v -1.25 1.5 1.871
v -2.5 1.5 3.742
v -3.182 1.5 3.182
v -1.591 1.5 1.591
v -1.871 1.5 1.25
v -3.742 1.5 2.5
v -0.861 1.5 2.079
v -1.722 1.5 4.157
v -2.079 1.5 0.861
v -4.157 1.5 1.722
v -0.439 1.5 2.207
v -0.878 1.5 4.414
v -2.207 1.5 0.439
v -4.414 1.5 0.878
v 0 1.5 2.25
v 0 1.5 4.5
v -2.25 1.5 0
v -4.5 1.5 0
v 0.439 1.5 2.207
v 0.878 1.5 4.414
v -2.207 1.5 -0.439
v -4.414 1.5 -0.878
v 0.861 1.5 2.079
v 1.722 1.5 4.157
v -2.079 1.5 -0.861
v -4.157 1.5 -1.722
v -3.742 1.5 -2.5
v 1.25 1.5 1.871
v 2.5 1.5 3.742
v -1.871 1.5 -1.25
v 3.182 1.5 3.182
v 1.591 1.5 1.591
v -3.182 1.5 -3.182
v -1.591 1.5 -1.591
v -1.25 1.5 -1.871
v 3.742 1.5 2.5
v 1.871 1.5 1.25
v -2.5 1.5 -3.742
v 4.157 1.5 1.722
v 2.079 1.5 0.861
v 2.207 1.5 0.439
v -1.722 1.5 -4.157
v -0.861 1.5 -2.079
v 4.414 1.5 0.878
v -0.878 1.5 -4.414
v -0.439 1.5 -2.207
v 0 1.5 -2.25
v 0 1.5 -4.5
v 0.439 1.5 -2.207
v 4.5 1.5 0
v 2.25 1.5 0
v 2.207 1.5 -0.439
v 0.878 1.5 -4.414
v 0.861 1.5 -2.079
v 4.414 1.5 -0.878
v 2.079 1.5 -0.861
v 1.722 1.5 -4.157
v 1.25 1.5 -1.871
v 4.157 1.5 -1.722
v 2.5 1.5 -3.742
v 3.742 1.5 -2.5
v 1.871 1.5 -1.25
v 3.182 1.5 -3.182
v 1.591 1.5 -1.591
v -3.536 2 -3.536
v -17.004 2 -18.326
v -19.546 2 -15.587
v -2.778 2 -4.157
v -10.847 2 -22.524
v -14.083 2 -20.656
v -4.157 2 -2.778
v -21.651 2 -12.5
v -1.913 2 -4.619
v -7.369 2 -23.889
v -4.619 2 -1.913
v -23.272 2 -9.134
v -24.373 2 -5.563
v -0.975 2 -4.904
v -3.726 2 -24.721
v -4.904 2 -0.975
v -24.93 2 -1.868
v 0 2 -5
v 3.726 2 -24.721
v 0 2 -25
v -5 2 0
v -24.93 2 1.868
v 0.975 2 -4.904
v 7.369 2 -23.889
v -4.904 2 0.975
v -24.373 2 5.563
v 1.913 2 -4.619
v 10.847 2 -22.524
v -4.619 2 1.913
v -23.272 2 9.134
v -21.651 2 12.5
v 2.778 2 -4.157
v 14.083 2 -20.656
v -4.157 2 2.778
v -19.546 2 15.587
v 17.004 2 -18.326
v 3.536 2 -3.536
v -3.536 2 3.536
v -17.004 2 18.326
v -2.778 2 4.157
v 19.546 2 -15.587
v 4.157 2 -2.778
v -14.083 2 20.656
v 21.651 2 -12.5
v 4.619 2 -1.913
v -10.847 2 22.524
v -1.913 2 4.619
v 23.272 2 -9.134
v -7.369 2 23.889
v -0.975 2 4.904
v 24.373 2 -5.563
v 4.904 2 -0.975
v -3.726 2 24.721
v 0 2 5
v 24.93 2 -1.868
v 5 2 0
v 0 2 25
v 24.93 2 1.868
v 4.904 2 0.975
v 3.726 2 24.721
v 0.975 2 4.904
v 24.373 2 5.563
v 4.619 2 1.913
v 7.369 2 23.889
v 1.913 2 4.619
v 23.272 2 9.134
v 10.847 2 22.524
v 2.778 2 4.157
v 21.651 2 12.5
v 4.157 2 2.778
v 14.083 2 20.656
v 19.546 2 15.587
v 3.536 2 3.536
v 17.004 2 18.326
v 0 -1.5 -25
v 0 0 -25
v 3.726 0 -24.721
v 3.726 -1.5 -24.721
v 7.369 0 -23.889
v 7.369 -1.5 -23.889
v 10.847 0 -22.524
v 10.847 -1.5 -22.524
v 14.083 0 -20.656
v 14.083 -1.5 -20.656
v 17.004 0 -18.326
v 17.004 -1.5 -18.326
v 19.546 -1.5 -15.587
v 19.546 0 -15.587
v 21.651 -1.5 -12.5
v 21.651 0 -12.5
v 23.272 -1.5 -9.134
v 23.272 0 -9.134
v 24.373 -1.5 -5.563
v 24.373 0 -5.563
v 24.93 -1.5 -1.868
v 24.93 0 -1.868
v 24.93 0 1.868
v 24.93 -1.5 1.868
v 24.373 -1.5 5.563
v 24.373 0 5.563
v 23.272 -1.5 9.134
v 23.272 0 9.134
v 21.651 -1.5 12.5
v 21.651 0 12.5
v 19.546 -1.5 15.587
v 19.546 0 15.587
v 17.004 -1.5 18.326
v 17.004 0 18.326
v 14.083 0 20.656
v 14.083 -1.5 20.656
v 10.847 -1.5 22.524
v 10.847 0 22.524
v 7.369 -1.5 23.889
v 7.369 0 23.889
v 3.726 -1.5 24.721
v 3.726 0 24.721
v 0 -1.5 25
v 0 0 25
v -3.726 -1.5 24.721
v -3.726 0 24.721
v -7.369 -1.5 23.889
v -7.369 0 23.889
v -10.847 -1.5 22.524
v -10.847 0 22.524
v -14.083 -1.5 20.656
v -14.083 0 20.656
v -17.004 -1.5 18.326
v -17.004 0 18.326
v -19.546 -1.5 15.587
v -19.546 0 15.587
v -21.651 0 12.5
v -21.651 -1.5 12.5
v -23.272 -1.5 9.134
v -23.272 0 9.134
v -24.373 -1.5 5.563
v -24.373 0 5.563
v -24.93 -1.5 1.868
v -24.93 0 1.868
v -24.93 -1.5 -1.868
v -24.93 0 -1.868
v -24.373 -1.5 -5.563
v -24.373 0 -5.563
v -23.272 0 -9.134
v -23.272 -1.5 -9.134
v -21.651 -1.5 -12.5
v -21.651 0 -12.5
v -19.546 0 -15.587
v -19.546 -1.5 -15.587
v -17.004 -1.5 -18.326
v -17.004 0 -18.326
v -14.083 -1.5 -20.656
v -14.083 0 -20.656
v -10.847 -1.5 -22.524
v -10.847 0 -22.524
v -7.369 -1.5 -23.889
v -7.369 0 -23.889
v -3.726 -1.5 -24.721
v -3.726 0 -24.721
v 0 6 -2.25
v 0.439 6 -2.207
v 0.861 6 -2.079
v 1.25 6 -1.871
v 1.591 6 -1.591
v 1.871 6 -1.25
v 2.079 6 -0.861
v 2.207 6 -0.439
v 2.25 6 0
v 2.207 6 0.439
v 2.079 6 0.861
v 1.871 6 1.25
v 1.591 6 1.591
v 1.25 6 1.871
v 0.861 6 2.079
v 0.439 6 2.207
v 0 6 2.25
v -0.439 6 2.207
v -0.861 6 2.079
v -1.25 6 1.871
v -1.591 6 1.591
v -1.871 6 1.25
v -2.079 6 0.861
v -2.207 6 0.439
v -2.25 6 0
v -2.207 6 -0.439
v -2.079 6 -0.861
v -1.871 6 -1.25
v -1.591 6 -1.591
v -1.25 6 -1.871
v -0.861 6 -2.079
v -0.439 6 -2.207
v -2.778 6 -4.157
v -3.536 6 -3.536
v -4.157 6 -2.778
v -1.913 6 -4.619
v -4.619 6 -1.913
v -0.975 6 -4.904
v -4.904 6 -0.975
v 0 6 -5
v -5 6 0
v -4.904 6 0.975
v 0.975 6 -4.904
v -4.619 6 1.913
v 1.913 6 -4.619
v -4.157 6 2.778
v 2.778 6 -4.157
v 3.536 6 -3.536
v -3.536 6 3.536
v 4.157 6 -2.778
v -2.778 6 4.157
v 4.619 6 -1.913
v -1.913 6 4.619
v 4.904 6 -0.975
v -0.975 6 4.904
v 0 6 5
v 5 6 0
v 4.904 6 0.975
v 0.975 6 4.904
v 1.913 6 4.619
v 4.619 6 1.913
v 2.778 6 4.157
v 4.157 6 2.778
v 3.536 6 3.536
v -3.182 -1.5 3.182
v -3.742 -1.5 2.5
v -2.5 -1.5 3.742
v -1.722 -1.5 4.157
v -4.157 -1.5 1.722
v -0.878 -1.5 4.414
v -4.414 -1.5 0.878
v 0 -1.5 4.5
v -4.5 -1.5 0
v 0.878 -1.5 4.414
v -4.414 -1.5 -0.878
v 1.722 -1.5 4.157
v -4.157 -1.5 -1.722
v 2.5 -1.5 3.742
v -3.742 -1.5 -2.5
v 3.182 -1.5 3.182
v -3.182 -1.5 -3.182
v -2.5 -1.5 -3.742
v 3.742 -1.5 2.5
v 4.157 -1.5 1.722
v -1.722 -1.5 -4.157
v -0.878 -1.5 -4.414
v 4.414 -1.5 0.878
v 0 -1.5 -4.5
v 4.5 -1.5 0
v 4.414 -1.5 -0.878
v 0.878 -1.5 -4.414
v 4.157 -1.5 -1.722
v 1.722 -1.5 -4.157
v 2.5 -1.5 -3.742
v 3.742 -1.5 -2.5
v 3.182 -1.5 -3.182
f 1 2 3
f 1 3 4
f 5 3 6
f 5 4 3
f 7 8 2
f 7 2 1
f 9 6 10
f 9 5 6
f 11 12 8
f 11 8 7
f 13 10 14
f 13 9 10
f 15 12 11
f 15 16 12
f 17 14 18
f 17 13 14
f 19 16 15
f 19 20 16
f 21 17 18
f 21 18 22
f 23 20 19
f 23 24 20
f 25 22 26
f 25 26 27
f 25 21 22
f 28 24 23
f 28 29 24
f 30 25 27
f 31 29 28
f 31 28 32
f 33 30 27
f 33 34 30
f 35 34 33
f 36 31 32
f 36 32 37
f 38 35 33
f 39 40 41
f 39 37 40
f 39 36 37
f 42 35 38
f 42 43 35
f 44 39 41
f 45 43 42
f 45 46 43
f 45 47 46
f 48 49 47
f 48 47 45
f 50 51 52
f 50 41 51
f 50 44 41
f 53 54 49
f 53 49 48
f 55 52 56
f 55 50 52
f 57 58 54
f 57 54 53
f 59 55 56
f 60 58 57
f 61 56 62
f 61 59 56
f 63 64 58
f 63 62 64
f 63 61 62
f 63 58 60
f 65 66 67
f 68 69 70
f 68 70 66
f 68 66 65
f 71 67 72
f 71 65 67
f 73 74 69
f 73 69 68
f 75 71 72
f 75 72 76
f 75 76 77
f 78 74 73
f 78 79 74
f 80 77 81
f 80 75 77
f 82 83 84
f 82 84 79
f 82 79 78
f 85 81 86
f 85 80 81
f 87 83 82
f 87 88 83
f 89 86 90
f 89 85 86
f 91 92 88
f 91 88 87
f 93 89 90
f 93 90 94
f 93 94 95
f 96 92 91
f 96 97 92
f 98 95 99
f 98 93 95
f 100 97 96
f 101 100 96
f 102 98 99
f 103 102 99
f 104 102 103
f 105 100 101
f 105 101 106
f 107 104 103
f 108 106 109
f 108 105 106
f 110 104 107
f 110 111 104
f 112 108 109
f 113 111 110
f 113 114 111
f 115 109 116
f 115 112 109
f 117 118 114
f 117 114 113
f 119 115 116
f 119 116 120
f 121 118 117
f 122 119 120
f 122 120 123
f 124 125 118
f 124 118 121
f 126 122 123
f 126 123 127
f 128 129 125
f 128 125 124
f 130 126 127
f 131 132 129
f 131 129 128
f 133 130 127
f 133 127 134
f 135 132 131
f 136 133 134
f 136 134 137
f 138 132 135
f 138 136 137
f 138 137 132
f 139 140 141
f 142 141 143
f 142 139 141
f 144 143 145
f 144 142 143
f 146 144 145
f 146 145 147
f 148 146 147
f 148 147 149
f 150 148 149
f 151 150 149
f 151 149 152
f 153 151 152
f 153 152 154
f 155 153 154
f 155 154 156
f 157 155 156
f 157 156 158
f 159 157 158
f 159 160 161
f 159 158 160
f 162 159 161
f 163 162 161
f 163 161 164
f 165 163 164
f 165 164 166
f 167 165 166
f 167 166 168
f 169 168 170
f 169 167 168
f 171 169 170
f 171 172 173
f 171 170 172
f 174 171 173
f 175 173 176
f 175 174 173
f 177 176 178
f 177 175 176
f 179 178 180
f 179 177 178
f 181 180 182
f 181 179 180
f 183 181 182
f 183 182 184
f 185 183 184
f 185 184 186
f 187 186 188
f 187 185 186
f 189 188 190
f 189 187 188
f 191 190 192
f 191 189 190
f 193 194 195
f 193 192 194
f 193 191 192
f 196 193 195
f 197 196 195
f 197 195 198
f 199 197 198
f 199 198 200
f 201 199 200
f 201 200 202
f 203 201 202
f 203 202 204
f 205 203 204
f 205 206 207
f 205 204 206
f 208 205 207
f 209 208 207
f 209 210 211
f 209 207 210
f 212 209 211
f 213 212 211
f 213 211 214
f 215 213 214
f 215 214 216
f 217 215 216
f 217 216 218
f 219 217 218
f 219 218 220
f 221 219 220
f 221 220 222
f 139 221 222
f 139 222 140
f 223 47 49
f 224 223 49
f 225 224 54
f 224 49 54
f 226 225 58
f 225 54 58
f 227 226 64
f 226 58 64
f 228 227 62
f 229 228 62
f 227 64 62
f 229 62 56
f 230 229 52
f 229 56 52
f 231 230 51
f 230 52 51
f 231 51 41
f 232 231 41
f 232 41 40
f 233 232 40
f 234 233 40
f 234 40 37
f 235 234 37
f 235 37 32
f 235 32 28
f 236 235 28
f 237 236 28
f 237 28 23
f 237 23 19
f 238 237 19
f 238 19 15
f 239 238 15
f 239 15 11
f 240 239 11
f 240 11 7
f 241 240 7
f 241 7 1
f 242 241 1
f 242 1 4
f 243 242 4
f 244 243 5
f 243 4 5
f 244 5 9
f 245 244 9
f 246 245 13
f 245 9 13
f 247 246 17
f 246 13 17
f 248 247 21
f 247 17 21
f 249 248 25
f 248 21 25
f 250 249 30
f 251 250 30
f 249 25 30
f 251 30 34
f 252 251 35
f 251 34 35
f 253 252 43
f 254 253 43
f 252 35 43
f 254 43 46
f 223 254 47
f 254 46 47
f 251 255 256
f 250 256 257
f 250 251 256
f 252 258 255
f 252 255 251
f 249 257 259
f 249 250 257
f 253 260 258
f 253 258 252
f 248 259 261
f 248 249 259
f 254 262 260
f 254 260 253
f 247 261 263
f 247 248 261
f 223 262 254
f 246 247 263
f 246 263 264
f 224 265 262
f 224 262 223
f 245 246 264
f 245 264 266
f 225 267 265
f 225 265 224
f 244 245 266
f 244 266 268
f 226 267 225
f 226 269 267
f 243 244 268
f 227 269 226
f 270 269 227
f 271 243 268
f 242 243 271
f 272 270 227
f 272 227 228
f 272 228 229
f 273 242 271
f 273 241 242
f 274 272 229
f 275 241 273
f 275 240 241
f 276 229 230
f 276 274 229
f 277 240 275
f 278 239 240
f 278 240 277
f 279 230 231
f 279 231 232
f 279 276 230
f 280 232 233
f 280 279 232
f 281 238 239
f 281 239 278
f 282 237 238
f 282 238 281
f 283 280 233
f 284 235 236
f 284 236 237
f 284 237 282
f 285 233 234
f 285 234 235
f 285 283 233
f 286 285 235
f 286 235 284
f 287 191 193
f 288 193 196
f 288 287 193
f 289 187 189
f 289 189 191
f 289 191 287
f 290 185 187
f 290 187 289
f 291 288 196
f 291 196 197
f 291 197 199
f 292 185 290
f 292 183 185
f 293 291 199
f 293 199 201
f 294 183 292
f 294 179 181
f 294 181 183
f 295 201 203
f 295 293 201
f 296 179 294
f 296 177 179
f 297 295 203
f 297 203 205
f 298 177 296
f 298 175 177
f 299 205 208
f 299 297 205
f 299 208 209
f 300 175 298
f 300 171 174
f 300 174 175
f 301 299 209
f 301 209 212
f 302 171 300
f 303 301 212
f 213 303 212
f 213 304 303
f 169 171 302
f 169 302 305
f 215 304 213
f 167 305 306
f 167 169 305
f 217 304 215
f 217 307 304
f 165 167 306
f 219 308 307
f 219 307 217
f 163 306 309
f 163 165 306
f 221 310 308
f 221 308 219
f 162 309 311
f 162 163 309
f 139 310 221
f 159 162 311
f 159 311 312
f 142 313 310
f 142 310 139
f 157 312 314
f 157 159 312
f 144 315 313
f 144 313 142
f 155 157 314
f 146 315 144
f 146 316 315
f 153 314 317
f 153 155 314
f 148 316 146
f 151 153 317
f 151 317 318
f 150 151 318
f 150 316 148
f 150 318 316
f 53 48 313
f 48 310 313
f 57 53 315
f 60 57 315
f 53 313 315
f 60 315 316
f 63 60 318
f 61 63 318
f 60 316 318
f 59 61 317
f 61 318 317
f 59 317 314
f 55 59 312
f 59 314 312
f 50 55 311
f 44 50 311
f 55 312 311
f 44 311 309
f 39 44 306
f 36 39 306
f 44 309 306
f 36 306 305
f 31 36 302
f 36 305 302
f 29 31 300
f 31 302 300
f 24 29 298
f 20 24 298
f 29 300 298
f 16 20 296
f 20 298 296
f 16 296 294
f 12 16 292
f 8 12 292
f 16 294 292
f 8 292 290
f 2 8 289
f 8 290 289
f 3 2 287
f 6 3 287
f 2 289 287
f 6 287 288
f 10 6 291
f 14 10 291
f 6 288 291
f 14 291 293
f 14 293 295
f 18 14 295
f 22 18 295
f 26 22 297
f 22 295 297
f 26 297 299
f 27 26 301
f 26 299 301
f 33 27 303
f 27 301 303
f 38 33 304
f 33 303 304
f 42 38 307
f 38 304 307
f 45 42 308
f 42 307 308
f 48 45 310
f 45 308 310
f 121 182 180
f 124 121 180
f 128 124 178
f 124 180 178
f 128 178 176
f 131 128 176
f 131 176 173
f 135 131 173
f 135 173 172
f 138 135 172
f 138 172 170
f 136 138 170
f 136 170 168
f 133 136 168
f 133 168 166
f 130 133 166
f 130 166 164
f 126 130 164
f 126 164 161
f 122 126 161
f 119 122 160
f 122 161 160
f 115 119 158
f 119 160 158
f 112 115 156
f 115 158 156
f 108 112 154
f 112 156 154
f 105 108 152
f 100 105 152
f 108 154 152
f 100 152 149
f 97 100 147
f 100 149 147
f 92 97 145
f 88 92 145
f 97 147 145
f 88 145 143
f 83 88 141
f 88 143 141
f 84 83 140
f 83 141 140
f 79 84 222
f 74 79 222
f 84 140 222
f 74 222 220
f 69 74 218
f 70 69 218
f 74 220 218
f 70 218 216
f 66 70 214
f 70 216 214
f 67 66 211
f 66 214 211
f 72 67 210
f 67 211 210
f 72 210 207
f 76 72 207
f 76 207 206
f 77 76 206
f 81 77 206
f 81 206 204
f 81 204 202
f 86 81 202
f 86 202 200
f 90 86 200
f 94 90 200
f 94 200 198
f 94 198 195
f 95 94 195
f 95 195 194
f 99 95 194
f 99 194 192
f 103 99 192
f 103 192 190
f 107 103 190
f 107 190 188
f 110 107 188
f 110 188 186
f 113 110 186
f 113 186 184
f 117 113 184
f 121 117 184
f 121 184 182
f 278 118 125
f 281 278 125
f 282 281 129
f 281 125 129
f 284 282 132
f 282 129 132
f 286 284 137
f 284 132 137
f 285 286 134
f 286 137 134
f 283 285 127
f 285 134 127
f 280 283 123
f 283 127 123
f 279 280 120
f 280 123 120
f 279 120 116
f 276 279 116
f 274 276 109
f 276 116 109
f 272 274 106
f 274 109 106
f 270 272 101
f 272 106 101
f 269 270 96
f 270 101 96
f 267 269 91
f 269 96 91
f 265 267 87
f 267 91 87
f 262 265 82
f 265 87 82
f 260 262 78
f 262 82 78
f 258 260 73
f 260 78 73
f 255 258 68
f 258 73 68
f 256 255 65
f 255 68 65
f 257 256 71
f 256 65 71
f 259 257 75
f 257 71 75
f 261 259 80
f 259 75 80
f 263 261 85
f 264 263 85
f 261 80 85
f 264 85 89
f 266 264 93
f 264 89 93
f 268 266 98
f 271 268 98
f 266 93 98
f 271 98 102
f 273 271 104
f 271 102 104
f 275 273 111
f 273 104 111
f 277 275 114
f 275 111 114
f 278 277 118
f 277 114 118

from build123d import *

# Parameters (mm, degrees)
SKETCH1_R           = 25
BOSS_EXTRUDE1_DEPTH = 2
SKETCH2_R           = 5
BOSS_EXTRUDE2_DEPTH = 4
SKETCH3_R           = 2.1
CUT_EXTRUDE1_DEPTH  = 20
SKETCH4_R           = 4.5
CUT_EXTRUDE2_DEPTH  = 5
SKETCH5_R           = 2.25
CUT_EXTRUDE3_DEPTH  = 10
BOSS_EXTRUDE3_START = 1.5
SKETCH6_R           = 25
SKETCH6_R_2         = 4.5
BOSS_EXTRUDE3_DEPTH = 1.5
BOSS_EXTRUDE5_START = 3.5
SKETCH7_R           = 4.5
SKETCH7_R_2         = 2.25
BOSS_EXTRUDE5_DEPTH = 3.5


with BuildPart() as part:
    # Sketch1 → Boss-Extrude1 (new body)
    with BuildSketch(Plane(origin=(0, 0, 0), x_dir=(1, 0, 0), z_dir=(0, 1, 0))):
        with Locations(Location((0, 0, 0), (0, 0, 270))):
            Circle(SKETCH1_R)
    extrude(amount=BOSS_EXTRUDE1_DEPTH)

    # Sketch2 → Boss-Extrude2 (add)
    with BuildSketch(Plane(origin=(0, 2, 0), x_dir=(1, 0, 0), z_dir=(0, 1, 0))):
        with Locations(Location((0, 0, 0), (0, 0, 270))):
            Circle(SKETCH2_R)
    extrude(amount=BOSS_EXTRUDE2_DEPTH)

    # Sketch3 → Cut-Extrude1 (cut)
    with BuildSketch(Plane.XZ):
        with Locations(Location((0, 0, 0), (0, 0, 270))):
            Circle(SKETCH3_R)
    extrude(amount=-CUT_EXTRUDE1_DEPTH, mode=Mode.SUBTRACT)

    # Sketch4 → Cut-Extrude2 (cut)
    with BuildSketch(Plane.XZ):
        with Locations(Location((0, 0, 0), (0, 0, 270))):
            Circle(SKETCH4_R)
    extrude(amount=-CUT_EXTRUDE2_DEPTH, mode=Mode.SUBTRACT)

    # Sketch5 → Cut-Extrude3 (cut)
    with BuildSketch(Plane.XZ.offset(-5)):
        with Locations(Location((0, 0, 0), (0, 0, 270))):
            Circle(SKETCH5_R)
    extrude(amount=-CUT_EXTRUDE3_DEPTH, mode=Mode.SUBTRACT)

    # Sketch6 → Boss-Extrude3 (add)
    with BuildSketch(Plane.XZ.offset(BOSS_EXTRUDE3_START)):
        with Locations(Location((0, 0, 0), (0, 0, 270))):
            Circle(SKETCH6_R)
        with Locations(Location((0, 0, 0), (0, 0, 270))):
            Circle(SKETCH6_R_2, mode=Mode.SUBTRACT)
    extrude(amount=-BOSS_EXTRUDE3_DEPTH)

    # Sketch7 → Boss-Extrude5 (add)
    with BuildSketch(Plane.XZ.offset(-5).offset(BOSS_EXTRUDE5_START)):
        with Locations(Location((0, 0, 0), (0, 0, 270))):
            Circle(SKETCH7_R)
        with Locations(Location((0, 0, 0), (0, 0, 270))):
            Circle(SKETCH7_R_2, mode=Mode.SUBTRACT)
    extrude(amount=-BOSS_EXTRUDE5_DEPTH)


solid = part.part
